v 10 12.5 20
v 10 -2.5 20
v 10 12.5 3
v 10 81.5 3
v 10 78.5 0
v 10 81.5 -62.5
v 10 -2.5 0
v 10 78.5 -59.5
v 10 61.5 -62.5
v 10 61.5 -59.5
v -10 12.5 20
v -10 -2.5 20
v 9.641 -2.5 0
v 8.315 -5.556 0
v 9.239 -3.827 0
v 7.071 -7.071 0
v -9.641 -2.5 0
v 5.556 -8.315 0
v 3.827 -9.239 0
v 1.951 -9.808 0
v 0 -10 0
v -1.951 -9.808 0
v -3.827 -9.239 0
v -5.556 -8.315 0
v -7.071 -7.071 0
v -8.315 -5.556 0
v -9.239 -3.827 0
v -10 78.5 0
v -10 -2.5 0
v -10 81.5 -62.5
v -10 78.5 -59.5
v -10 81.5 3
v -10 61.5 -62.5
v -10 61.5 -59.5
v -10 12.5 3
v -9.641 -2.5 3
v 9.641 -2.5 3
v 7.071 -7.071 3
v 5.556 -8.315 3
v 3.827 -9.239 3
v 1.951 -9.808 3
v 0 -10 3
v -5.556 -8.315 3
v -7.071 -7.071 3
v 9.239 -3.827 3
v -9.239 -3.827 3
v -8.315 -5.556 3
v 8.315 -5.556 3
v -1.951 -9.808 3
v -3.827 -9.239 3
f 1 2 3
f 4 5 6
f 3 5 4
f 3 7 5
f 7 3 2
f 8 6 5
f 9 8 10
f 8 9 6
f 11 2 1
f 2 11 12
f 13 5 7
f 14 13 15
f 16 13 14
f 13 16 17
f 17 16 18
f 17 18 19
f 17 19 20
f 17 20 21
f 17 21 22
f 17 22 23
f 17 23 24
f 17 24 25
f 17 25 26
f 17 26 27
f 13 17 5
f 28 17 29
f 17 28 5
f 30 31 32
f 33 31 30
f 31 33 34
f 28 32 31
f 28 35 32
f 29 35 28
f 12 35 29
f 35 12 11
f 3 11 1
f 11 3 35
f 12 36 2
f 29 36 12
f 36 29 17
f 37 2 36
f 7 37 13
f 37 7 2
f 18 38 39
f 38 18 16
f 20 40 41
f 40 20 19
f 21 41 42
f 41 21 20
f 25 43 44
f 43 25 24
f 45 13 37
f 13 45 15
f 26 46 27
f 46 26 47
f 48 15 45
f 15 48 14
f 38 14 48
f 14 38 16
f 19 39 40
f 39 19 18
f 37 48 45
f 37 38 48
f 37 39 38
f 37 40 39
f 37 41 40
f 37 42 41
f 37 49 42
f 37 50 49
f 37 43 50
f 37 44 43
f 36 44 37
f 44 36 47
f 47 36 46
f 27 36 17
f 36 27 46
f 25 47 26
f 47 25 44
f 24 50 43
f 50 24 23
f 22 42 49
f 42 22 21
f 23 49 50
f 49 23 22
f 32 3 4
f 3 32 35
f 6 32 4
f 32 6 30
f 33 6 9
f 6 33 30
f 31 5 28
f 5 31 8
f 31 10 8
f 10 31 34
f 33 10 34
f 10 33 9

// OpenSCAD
// set thickness
thickness = 3;
width = 20;

// // Draw spool mount cylinder
// translate([0, 0, 45])
// cylinder(90, 16.4, 16.4, true);
//
// // Draw spool mount stop
// translate([0, 3, 88.4])
// cube([32.6, 10, thickness], true);
// translate([0, 6, 88.4])
// cylinder(thickness, 16.4, 16.4, true);

// // Draw spool mount cylinder
translate([0, 5, 10])
cube([width,15,20], true);

// draw rounded edge of 
cylinder(thickness, r=10, $fn=32);

// draw long edge of holder
translate([0, 40, thickness/2])
cube([width, 28+55, thickness], true);

translate([0, 80, -30])
cube([width, thickness, 65], true);

translate([0, 70, -61])
cube([width, 14+thickness, thickness], true);
